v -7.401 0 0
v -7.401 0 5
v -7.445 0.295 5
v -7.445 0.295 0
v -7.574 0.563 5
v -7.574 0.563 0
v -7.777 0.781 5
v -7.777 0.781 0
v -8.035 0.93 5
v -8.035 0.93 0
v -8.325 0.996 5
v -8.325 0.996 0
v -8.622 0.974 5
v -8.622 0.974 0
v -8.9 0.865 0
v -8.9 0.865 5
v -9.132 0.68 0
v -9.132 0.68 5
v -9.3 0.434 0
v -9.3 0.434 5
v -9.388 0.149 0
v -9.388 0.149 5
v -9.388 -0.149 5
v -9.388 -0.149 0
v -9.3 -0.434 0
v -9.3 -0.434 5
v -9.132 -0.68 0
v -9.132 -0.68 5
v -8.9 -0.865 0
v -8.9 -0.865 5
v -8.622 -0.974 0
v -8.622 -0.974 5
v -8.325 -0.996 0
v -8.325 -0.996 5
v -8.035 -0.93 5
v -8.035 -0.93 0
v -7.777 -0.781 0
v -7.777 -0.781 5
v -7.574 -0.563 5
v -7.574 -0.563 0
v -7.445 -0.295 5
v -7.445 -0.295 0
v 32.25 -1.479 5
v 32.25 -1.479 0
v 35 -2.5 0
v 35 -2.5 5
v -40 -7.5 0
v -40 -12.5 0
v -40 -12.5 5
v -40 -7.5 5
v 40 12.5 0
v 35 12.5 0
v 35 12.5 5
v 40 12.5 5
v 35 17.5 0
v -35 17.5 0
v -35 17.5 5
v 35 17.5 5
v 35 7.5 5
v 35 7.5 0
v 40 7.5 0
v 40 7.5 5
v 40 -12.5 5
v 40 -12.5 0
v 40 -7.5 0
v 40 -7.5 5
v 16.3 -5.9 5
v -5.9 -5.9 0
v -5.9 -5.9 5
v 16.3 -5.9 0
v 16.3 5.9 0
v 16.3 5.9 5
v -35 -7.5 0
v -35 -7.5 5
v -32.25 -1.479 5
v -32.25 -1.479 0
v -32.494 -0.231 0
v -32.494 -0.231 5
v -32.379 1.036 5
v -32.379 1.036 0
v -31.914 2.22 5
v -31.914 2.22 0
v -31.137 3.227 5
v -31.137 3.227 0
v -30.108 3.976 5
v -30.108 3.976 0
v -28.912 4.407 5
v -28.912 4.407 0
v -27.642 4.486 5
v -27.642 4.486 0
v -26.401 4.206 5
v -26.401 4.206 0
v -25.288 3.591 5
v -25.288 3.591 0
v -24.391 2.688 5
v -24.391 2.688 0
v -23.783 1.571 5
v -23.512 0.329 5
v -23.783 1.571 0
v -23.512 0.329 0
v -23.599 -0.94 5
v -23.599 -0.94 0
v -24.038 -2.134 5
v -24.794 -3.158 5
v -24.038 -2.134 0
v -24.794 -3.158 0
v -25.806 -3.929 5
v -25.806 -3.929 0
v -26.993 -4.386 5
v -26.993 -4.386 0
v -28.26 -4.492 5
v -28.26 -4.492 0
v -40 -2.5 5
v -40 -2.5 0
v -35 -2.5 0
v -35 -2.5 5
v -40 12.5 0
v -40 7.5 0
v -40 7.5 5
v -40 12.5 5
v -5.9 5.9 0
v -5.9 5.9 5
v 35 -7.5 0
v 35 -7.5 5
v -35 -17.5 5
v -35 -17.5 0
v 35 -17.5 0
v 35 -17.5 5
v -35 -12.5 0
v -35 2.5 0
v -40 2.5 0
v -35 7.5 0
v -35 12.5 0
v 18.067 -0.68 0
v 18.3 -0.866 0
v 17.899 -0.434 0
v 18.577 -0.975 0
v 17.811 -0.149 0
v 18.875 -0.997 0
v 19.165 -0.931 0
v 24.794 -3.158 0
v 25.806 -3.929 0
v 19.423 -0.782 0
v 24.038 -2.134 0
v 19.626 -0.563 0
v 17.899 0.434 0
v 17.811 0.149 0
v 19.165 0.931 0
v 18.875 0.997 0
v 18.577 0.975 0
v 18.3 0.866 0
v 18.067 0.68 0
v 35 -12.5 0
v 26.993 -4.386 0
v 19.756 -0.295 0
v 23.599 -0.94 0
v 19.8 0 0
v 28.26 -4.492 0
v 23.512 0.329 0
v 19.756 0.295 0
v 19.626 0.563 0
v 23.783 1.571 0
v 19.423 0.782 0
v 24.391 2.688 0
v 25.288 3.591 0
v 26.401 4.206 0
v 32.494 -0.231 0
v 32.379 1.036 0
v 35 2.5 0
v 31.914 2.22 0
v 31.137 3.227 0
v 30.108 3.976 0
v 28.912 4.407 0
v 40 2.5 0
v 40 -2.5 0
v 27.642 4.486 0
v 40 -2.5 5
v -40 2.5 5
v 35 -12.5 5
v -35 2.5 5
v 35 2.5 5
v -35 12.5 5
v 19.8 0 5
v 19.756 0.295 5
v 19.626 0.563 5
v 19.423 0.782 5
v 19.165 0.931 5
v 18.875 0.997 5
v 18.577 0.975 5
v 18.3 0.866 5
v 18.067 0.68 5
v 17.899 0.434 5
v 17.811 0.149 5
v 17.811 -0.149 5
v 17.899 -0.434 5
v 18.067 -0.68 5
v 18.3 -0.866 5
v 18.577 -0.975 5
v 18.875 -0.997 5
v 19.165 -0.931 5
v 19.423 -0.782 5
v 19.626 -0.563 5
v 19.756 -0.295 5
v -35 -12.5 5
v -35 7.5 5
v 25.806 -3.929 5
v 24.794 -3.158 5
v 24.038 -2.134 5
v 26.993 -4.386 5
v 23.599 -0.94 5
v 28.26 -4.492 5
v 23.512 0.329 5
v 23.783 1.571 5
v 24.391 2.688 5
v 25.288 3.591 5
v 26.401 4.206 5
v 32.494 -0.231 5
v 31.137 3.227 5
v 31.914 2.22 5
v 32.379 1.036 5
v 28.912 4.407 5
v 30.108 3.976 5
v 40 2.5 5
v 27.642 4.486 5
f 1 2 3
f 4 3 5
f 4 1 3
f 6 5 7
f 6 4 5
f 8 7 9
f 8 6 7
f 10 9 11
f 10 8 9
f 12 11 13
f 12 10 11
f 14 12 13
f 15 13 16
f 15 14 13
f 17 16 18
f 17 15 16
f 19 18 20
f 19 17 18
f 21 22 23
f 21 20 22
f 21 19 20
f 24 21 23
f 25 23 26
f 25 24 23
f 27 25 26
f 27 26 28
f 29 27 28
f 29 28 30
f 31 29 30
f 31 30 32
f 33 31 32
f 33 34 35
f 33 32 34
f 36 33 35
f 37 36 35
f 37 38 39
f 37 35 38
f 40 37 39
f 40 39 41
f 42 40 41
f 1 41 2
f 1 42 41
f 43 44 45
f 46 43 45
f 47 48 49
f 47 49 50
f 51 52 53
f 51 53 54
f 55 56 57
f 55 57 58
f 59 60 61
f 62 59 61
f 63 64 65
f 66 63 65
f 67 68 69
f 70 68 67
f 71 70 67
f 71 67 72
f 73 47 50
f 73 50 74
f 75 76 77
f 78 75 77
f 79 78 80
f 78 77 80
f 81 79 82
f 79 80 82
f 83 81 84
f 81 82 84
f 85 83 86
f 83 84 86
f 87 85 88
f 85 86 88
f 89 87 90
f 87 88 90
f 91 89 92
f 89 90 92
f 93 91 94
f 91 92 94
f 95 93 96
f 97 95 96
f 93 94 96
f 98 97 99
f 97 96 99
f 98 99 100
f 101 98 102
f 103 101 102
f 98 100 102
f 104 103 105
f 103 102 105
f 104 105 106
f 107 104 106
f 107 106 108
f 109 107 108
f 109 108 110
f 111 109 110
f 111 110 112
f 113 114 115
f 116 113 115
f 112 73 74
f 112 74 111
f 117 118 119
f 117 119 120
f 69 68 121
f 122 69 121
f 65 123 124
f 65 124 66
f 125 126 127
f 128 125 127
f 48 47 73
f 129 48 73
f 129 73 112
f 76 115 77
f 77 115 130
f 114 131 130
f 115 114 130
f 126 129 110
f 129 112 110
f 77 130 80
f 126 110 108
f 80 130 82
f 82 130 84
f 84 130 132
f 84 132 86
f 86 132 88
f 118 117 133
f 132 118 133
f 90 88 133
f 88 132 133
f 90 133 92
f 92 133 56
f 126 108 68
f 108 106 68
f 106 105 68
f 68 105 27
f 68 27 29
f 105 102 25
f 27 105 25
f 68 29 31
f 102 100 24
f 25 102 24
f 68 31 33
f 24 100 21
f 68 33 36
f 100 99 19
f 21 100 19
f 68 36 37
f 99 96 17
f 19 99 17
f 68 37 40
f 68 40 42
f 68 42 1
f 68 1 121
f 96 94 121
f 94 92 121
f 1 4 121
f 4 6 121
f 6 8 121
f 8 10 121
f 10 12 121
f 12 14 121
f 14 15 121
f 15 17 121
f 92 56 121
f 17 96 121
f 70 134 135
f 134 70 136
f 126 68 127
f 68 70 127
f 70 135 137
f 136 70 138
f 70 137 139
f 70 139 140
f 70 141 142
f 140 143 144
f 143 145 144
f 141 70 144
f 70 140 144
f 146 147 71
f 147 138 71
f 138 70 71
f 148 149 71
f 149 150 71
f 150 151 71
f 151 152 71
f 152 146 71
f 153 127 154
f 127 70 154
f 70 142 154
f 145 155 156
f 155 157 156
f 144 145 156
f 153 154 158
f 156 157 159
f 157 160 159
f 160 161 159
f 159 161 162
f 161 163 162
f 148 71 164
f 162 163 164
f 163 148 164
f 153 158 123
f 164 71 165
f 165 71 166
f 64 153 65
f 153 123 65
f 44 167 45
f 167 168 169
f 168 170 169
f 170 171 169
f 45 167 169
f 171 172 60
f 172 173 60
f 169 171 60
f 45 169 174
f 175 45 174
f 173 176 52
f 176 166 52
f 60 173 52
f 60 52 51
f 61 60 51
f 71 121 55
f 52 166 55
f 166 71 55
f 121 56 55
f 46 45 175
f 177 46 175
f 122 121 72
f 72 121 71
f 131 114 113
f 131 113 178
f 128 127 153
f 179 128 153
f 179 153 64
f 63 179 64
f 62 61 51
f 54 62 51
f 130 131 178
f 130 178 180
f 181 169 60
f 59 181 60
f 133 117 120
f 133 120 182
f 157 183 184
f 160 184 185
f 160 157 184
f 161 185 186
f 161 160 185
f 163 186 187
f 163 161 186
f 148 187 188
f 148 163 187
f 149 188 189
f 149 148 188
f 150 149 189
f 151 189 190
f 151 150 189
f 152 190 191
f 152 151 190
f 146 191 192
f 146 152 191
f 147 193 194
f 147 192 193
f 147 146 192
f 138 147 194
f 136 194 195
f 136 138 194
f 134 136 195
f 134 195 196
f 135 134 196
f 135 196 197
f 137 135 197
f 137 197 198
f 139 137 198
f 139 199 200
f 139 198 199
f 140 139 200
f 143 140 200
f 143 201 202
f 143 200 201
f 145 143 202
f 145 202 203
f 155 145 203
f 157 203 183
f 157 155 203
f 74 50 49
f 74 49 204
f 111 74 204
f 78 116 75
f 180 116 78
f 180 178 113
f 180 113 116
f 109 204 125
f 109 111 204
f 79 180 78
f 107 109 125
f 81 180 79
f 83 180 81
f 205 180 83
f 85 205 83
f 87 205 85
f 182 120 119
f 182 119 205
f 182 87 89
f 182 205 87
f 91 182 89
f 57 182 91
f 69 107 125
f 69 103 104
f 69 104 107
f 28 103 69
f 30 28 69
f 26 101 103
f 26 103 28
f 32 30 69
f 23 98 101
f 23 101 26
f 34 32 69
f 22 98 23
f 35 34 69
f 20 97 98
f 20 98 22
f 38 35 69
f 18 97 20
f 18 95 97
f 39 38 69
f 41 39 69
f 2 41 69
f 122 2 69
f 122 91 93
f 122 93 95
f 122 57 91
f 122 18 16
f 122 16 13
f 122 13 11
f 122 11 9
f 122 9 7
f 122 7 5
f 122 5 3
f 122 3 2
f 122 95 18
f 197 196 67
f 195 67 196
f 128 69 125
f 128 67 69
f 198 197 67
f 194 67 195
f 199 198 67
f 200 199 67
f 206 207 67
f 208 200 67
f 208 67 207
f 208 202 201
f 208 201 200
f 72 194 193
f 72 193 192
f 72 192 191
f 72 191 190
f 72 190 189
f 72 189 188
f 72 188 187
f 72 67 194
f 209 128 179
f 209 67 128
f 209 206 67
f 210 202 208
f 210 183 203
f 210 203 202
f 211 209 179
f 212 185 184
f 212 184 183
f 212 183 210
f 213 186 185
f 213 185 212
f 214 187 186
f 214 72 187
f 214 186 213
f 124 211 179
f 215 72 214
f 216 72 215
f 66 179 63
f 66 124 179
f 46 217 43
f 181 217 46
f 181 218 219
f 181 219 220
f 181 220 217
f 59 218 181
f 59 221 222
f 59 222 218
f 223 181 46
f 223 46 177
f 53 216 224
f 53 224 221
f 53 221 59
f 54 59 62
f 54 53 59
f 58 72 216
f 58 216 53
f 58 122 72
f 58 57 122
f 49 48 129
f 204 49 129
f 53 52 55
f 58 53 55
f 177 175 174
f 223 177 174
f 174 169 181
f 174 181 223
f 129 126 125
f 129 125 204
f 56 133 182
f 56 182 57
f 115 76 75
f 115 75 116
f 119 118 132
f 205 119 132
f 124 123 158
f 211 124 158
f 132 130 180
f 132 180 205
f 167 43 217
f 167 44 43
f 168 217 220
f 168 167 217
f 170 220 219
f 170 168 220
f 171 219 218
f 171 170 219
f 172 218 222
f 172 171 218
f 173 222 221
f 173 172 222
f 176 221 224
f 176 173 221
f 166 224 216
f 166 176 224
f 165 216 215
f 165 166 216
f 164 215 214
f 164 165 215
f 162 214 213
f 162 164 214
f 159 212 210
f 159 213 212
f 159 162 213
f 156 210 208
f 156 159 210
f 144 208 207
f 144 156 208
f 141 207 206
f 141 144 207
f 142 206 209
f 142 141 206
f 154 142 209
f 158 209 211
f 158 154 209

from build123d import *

# Parameters (mm, degrees)
ESQUISSE1_W                = 80
ESQUISSE1_H                = 35
BOSS_EXTRU_1_DEPTH         = 5
ESQUISSE3_W                = 5
ESQUISSE3_H                = 5
ENL_V_MAT_EXTRU_1_DEPTH    = 10
R_P_TITION_LIN_AIRE1_COUNT = 4
R_P_TITION_LIN_AIRE1_PITCH = 10
ESQUISSE4_W                = 5
ESQUISSE4_H                = 5
ENL_V_MAT_EXTRU_2_DEPTH    = 10
R_P_TITION_LIN_AIRE2_COUNT = 4
R_P_TITION_LIN_AIRE2_PITCH = 10
ESQUISSE6_W                = 22.2
ESQUISSE6_H                = 11.8
ENL_V_MAT_EXTRU_5_DEPTH    = 10
ESQUISSE7_R                = 1
ESQUISSE7_R_2              = 0.999214349
ENL_V_MAT_EXTRU_7_DEPTH    = 10
ESQUISSE8_R                = 4.5
ENL_V_MAT_EXTRU_8_DEPTH    = 10
ENL_V_MAT_EXTRU_9_DEPTH    = 10


with BuildPart() as part:
    # Esquisse1 → Boss.-Extru.1 (new body)
    with BuildSketch(Plane.XY):
        Rectangle(ESQUISSE1_W, ESQUISSE1_H)
    extrude(amount=BOSS_EXTRU_1_DEPTH)

    # Esquisse3 → Enlèv. mat.-Extru.1 (cut)
    with BuildSketch(Plane.XY):
        with Locations((37.5, -15)):
            Rectangle(ESQUISSE3_W, ESQUISSE3_H)
    enl_v_mat_extru_1 = extrude(amount=ENL_V_MAT_EXTRU_1_DEPTH, mode=Mode.SUBTRACT)

    # Répétition linéaire1: Enlèv. mat.-Extru.1 ×4
    with Locations(*[(0, i * R_P_TITION_LIN_AIRE1_PITCH, 0) for i in range(1, R_P_TITION_LIN_AIRE1_COUNT)]):
        add(enl_v_mat_extru_1, mode=Mode.SUBTRACT)

    # Esquisse4 → Enlèv. mat.-Extru.2 (cut)
    with BuildSketch(Plane.XY):
        with Locations((-37.5, -15)):
            Rectangle(ESQUISSE4_W, ESQUISSE4_H)
    enl_v_mat_extru_2 = extrude(amount=ENL_V_MAT_EXTRU_2_DEPTH, mode=Mode.SUBTRACT)

    # Répétition linéaire2: Enlèv. mat.-Extru.2 ×4
    with Locations(*[(0, i * R_P_TITION_LIN_AIRE2_PITCH, 0) for i in range(1, R_P_TITION_LIN_AIRE2_COUNT)]):
        add(enl_v_mat_extru_2, mode=Mode.SUBTRACT)

    # Esquisse6 → Enlèv. mat.-Extru.5 (cut)
    with BuildSketch(Plane.XY):
        with Locations((5.2, 0)):
            Rectangle(ESQUISSE6_W, ESQUISSE6_H)
    extrude(amount=ENL_V_MAT_EXTRU_5_DEPTH, mode=Mode.SUBTRACT)

    # Esquisse7 → Enlèv. mat.-Extru.7 (cut)
    with BuildSketch(Plane.XY):
        with Locations((18.8, 0)):
            Circle(ESQUISSE7_R)
        with Locations((-8.4, 0)):
            Circle(ESQUISSE7_R_2)
    extrude(amount=ENL_V_MAT_EXTRU_7_DEPTH, mode=Mode.SUBTRACT)

    # Esquisse8 → Enlèv. mat.-Extru.8 (cut)
    with BuildSketch(Plane(origin=(0, 0, 0), x_dir=(-1, 0, 0), z_dir=(0, 0, -1))):
        with Locations((28, 0)):
            Circle(ESQUISSE8_R)
    enl_v_mat_extru_8 = extrude(amount=-ENL_V_MAT_EXTRU_8_DEPTH, mode=Mode.SUBTRACT)

    # Esquisse9 → Enlèv. mat.-Extru.9 (cut)
    with BuildSketch(Plane(origin=(0, 0, 0), x_dir=(-1, 0, 0), z_dir=(0, 0, -1))):
        Polygon((32.25, -1.479019946), (35, -2.5), (35, -7.5), (28.260126937, -4.492475262), align=None)
    enl_v_mat_extru_9 = extrude(amount=-ENL_V_MAT_EXTRU_9_DEPTH, mode=Mode.SUBTRACT)

    # Symétrie1: Enlèv. mat.-Extru.8, Enlèv. mat.-Extru.9 across plane
    add(enl_v_mat_extru_8.mirror(Plane(origin=(0, 0, 0), x_dir=(0, 0, 1), z_dir=(1, 0, 0))), mode=Mode.SUBTRACT)
    add(enl_v_mat_extru_9.mirror(Plane(origin=(0, 0, 0), x_dir=(0, 0, 1), z_dir=(1, 0, 0))), mode=Mode.SUBTRACT)


solid = part.part
